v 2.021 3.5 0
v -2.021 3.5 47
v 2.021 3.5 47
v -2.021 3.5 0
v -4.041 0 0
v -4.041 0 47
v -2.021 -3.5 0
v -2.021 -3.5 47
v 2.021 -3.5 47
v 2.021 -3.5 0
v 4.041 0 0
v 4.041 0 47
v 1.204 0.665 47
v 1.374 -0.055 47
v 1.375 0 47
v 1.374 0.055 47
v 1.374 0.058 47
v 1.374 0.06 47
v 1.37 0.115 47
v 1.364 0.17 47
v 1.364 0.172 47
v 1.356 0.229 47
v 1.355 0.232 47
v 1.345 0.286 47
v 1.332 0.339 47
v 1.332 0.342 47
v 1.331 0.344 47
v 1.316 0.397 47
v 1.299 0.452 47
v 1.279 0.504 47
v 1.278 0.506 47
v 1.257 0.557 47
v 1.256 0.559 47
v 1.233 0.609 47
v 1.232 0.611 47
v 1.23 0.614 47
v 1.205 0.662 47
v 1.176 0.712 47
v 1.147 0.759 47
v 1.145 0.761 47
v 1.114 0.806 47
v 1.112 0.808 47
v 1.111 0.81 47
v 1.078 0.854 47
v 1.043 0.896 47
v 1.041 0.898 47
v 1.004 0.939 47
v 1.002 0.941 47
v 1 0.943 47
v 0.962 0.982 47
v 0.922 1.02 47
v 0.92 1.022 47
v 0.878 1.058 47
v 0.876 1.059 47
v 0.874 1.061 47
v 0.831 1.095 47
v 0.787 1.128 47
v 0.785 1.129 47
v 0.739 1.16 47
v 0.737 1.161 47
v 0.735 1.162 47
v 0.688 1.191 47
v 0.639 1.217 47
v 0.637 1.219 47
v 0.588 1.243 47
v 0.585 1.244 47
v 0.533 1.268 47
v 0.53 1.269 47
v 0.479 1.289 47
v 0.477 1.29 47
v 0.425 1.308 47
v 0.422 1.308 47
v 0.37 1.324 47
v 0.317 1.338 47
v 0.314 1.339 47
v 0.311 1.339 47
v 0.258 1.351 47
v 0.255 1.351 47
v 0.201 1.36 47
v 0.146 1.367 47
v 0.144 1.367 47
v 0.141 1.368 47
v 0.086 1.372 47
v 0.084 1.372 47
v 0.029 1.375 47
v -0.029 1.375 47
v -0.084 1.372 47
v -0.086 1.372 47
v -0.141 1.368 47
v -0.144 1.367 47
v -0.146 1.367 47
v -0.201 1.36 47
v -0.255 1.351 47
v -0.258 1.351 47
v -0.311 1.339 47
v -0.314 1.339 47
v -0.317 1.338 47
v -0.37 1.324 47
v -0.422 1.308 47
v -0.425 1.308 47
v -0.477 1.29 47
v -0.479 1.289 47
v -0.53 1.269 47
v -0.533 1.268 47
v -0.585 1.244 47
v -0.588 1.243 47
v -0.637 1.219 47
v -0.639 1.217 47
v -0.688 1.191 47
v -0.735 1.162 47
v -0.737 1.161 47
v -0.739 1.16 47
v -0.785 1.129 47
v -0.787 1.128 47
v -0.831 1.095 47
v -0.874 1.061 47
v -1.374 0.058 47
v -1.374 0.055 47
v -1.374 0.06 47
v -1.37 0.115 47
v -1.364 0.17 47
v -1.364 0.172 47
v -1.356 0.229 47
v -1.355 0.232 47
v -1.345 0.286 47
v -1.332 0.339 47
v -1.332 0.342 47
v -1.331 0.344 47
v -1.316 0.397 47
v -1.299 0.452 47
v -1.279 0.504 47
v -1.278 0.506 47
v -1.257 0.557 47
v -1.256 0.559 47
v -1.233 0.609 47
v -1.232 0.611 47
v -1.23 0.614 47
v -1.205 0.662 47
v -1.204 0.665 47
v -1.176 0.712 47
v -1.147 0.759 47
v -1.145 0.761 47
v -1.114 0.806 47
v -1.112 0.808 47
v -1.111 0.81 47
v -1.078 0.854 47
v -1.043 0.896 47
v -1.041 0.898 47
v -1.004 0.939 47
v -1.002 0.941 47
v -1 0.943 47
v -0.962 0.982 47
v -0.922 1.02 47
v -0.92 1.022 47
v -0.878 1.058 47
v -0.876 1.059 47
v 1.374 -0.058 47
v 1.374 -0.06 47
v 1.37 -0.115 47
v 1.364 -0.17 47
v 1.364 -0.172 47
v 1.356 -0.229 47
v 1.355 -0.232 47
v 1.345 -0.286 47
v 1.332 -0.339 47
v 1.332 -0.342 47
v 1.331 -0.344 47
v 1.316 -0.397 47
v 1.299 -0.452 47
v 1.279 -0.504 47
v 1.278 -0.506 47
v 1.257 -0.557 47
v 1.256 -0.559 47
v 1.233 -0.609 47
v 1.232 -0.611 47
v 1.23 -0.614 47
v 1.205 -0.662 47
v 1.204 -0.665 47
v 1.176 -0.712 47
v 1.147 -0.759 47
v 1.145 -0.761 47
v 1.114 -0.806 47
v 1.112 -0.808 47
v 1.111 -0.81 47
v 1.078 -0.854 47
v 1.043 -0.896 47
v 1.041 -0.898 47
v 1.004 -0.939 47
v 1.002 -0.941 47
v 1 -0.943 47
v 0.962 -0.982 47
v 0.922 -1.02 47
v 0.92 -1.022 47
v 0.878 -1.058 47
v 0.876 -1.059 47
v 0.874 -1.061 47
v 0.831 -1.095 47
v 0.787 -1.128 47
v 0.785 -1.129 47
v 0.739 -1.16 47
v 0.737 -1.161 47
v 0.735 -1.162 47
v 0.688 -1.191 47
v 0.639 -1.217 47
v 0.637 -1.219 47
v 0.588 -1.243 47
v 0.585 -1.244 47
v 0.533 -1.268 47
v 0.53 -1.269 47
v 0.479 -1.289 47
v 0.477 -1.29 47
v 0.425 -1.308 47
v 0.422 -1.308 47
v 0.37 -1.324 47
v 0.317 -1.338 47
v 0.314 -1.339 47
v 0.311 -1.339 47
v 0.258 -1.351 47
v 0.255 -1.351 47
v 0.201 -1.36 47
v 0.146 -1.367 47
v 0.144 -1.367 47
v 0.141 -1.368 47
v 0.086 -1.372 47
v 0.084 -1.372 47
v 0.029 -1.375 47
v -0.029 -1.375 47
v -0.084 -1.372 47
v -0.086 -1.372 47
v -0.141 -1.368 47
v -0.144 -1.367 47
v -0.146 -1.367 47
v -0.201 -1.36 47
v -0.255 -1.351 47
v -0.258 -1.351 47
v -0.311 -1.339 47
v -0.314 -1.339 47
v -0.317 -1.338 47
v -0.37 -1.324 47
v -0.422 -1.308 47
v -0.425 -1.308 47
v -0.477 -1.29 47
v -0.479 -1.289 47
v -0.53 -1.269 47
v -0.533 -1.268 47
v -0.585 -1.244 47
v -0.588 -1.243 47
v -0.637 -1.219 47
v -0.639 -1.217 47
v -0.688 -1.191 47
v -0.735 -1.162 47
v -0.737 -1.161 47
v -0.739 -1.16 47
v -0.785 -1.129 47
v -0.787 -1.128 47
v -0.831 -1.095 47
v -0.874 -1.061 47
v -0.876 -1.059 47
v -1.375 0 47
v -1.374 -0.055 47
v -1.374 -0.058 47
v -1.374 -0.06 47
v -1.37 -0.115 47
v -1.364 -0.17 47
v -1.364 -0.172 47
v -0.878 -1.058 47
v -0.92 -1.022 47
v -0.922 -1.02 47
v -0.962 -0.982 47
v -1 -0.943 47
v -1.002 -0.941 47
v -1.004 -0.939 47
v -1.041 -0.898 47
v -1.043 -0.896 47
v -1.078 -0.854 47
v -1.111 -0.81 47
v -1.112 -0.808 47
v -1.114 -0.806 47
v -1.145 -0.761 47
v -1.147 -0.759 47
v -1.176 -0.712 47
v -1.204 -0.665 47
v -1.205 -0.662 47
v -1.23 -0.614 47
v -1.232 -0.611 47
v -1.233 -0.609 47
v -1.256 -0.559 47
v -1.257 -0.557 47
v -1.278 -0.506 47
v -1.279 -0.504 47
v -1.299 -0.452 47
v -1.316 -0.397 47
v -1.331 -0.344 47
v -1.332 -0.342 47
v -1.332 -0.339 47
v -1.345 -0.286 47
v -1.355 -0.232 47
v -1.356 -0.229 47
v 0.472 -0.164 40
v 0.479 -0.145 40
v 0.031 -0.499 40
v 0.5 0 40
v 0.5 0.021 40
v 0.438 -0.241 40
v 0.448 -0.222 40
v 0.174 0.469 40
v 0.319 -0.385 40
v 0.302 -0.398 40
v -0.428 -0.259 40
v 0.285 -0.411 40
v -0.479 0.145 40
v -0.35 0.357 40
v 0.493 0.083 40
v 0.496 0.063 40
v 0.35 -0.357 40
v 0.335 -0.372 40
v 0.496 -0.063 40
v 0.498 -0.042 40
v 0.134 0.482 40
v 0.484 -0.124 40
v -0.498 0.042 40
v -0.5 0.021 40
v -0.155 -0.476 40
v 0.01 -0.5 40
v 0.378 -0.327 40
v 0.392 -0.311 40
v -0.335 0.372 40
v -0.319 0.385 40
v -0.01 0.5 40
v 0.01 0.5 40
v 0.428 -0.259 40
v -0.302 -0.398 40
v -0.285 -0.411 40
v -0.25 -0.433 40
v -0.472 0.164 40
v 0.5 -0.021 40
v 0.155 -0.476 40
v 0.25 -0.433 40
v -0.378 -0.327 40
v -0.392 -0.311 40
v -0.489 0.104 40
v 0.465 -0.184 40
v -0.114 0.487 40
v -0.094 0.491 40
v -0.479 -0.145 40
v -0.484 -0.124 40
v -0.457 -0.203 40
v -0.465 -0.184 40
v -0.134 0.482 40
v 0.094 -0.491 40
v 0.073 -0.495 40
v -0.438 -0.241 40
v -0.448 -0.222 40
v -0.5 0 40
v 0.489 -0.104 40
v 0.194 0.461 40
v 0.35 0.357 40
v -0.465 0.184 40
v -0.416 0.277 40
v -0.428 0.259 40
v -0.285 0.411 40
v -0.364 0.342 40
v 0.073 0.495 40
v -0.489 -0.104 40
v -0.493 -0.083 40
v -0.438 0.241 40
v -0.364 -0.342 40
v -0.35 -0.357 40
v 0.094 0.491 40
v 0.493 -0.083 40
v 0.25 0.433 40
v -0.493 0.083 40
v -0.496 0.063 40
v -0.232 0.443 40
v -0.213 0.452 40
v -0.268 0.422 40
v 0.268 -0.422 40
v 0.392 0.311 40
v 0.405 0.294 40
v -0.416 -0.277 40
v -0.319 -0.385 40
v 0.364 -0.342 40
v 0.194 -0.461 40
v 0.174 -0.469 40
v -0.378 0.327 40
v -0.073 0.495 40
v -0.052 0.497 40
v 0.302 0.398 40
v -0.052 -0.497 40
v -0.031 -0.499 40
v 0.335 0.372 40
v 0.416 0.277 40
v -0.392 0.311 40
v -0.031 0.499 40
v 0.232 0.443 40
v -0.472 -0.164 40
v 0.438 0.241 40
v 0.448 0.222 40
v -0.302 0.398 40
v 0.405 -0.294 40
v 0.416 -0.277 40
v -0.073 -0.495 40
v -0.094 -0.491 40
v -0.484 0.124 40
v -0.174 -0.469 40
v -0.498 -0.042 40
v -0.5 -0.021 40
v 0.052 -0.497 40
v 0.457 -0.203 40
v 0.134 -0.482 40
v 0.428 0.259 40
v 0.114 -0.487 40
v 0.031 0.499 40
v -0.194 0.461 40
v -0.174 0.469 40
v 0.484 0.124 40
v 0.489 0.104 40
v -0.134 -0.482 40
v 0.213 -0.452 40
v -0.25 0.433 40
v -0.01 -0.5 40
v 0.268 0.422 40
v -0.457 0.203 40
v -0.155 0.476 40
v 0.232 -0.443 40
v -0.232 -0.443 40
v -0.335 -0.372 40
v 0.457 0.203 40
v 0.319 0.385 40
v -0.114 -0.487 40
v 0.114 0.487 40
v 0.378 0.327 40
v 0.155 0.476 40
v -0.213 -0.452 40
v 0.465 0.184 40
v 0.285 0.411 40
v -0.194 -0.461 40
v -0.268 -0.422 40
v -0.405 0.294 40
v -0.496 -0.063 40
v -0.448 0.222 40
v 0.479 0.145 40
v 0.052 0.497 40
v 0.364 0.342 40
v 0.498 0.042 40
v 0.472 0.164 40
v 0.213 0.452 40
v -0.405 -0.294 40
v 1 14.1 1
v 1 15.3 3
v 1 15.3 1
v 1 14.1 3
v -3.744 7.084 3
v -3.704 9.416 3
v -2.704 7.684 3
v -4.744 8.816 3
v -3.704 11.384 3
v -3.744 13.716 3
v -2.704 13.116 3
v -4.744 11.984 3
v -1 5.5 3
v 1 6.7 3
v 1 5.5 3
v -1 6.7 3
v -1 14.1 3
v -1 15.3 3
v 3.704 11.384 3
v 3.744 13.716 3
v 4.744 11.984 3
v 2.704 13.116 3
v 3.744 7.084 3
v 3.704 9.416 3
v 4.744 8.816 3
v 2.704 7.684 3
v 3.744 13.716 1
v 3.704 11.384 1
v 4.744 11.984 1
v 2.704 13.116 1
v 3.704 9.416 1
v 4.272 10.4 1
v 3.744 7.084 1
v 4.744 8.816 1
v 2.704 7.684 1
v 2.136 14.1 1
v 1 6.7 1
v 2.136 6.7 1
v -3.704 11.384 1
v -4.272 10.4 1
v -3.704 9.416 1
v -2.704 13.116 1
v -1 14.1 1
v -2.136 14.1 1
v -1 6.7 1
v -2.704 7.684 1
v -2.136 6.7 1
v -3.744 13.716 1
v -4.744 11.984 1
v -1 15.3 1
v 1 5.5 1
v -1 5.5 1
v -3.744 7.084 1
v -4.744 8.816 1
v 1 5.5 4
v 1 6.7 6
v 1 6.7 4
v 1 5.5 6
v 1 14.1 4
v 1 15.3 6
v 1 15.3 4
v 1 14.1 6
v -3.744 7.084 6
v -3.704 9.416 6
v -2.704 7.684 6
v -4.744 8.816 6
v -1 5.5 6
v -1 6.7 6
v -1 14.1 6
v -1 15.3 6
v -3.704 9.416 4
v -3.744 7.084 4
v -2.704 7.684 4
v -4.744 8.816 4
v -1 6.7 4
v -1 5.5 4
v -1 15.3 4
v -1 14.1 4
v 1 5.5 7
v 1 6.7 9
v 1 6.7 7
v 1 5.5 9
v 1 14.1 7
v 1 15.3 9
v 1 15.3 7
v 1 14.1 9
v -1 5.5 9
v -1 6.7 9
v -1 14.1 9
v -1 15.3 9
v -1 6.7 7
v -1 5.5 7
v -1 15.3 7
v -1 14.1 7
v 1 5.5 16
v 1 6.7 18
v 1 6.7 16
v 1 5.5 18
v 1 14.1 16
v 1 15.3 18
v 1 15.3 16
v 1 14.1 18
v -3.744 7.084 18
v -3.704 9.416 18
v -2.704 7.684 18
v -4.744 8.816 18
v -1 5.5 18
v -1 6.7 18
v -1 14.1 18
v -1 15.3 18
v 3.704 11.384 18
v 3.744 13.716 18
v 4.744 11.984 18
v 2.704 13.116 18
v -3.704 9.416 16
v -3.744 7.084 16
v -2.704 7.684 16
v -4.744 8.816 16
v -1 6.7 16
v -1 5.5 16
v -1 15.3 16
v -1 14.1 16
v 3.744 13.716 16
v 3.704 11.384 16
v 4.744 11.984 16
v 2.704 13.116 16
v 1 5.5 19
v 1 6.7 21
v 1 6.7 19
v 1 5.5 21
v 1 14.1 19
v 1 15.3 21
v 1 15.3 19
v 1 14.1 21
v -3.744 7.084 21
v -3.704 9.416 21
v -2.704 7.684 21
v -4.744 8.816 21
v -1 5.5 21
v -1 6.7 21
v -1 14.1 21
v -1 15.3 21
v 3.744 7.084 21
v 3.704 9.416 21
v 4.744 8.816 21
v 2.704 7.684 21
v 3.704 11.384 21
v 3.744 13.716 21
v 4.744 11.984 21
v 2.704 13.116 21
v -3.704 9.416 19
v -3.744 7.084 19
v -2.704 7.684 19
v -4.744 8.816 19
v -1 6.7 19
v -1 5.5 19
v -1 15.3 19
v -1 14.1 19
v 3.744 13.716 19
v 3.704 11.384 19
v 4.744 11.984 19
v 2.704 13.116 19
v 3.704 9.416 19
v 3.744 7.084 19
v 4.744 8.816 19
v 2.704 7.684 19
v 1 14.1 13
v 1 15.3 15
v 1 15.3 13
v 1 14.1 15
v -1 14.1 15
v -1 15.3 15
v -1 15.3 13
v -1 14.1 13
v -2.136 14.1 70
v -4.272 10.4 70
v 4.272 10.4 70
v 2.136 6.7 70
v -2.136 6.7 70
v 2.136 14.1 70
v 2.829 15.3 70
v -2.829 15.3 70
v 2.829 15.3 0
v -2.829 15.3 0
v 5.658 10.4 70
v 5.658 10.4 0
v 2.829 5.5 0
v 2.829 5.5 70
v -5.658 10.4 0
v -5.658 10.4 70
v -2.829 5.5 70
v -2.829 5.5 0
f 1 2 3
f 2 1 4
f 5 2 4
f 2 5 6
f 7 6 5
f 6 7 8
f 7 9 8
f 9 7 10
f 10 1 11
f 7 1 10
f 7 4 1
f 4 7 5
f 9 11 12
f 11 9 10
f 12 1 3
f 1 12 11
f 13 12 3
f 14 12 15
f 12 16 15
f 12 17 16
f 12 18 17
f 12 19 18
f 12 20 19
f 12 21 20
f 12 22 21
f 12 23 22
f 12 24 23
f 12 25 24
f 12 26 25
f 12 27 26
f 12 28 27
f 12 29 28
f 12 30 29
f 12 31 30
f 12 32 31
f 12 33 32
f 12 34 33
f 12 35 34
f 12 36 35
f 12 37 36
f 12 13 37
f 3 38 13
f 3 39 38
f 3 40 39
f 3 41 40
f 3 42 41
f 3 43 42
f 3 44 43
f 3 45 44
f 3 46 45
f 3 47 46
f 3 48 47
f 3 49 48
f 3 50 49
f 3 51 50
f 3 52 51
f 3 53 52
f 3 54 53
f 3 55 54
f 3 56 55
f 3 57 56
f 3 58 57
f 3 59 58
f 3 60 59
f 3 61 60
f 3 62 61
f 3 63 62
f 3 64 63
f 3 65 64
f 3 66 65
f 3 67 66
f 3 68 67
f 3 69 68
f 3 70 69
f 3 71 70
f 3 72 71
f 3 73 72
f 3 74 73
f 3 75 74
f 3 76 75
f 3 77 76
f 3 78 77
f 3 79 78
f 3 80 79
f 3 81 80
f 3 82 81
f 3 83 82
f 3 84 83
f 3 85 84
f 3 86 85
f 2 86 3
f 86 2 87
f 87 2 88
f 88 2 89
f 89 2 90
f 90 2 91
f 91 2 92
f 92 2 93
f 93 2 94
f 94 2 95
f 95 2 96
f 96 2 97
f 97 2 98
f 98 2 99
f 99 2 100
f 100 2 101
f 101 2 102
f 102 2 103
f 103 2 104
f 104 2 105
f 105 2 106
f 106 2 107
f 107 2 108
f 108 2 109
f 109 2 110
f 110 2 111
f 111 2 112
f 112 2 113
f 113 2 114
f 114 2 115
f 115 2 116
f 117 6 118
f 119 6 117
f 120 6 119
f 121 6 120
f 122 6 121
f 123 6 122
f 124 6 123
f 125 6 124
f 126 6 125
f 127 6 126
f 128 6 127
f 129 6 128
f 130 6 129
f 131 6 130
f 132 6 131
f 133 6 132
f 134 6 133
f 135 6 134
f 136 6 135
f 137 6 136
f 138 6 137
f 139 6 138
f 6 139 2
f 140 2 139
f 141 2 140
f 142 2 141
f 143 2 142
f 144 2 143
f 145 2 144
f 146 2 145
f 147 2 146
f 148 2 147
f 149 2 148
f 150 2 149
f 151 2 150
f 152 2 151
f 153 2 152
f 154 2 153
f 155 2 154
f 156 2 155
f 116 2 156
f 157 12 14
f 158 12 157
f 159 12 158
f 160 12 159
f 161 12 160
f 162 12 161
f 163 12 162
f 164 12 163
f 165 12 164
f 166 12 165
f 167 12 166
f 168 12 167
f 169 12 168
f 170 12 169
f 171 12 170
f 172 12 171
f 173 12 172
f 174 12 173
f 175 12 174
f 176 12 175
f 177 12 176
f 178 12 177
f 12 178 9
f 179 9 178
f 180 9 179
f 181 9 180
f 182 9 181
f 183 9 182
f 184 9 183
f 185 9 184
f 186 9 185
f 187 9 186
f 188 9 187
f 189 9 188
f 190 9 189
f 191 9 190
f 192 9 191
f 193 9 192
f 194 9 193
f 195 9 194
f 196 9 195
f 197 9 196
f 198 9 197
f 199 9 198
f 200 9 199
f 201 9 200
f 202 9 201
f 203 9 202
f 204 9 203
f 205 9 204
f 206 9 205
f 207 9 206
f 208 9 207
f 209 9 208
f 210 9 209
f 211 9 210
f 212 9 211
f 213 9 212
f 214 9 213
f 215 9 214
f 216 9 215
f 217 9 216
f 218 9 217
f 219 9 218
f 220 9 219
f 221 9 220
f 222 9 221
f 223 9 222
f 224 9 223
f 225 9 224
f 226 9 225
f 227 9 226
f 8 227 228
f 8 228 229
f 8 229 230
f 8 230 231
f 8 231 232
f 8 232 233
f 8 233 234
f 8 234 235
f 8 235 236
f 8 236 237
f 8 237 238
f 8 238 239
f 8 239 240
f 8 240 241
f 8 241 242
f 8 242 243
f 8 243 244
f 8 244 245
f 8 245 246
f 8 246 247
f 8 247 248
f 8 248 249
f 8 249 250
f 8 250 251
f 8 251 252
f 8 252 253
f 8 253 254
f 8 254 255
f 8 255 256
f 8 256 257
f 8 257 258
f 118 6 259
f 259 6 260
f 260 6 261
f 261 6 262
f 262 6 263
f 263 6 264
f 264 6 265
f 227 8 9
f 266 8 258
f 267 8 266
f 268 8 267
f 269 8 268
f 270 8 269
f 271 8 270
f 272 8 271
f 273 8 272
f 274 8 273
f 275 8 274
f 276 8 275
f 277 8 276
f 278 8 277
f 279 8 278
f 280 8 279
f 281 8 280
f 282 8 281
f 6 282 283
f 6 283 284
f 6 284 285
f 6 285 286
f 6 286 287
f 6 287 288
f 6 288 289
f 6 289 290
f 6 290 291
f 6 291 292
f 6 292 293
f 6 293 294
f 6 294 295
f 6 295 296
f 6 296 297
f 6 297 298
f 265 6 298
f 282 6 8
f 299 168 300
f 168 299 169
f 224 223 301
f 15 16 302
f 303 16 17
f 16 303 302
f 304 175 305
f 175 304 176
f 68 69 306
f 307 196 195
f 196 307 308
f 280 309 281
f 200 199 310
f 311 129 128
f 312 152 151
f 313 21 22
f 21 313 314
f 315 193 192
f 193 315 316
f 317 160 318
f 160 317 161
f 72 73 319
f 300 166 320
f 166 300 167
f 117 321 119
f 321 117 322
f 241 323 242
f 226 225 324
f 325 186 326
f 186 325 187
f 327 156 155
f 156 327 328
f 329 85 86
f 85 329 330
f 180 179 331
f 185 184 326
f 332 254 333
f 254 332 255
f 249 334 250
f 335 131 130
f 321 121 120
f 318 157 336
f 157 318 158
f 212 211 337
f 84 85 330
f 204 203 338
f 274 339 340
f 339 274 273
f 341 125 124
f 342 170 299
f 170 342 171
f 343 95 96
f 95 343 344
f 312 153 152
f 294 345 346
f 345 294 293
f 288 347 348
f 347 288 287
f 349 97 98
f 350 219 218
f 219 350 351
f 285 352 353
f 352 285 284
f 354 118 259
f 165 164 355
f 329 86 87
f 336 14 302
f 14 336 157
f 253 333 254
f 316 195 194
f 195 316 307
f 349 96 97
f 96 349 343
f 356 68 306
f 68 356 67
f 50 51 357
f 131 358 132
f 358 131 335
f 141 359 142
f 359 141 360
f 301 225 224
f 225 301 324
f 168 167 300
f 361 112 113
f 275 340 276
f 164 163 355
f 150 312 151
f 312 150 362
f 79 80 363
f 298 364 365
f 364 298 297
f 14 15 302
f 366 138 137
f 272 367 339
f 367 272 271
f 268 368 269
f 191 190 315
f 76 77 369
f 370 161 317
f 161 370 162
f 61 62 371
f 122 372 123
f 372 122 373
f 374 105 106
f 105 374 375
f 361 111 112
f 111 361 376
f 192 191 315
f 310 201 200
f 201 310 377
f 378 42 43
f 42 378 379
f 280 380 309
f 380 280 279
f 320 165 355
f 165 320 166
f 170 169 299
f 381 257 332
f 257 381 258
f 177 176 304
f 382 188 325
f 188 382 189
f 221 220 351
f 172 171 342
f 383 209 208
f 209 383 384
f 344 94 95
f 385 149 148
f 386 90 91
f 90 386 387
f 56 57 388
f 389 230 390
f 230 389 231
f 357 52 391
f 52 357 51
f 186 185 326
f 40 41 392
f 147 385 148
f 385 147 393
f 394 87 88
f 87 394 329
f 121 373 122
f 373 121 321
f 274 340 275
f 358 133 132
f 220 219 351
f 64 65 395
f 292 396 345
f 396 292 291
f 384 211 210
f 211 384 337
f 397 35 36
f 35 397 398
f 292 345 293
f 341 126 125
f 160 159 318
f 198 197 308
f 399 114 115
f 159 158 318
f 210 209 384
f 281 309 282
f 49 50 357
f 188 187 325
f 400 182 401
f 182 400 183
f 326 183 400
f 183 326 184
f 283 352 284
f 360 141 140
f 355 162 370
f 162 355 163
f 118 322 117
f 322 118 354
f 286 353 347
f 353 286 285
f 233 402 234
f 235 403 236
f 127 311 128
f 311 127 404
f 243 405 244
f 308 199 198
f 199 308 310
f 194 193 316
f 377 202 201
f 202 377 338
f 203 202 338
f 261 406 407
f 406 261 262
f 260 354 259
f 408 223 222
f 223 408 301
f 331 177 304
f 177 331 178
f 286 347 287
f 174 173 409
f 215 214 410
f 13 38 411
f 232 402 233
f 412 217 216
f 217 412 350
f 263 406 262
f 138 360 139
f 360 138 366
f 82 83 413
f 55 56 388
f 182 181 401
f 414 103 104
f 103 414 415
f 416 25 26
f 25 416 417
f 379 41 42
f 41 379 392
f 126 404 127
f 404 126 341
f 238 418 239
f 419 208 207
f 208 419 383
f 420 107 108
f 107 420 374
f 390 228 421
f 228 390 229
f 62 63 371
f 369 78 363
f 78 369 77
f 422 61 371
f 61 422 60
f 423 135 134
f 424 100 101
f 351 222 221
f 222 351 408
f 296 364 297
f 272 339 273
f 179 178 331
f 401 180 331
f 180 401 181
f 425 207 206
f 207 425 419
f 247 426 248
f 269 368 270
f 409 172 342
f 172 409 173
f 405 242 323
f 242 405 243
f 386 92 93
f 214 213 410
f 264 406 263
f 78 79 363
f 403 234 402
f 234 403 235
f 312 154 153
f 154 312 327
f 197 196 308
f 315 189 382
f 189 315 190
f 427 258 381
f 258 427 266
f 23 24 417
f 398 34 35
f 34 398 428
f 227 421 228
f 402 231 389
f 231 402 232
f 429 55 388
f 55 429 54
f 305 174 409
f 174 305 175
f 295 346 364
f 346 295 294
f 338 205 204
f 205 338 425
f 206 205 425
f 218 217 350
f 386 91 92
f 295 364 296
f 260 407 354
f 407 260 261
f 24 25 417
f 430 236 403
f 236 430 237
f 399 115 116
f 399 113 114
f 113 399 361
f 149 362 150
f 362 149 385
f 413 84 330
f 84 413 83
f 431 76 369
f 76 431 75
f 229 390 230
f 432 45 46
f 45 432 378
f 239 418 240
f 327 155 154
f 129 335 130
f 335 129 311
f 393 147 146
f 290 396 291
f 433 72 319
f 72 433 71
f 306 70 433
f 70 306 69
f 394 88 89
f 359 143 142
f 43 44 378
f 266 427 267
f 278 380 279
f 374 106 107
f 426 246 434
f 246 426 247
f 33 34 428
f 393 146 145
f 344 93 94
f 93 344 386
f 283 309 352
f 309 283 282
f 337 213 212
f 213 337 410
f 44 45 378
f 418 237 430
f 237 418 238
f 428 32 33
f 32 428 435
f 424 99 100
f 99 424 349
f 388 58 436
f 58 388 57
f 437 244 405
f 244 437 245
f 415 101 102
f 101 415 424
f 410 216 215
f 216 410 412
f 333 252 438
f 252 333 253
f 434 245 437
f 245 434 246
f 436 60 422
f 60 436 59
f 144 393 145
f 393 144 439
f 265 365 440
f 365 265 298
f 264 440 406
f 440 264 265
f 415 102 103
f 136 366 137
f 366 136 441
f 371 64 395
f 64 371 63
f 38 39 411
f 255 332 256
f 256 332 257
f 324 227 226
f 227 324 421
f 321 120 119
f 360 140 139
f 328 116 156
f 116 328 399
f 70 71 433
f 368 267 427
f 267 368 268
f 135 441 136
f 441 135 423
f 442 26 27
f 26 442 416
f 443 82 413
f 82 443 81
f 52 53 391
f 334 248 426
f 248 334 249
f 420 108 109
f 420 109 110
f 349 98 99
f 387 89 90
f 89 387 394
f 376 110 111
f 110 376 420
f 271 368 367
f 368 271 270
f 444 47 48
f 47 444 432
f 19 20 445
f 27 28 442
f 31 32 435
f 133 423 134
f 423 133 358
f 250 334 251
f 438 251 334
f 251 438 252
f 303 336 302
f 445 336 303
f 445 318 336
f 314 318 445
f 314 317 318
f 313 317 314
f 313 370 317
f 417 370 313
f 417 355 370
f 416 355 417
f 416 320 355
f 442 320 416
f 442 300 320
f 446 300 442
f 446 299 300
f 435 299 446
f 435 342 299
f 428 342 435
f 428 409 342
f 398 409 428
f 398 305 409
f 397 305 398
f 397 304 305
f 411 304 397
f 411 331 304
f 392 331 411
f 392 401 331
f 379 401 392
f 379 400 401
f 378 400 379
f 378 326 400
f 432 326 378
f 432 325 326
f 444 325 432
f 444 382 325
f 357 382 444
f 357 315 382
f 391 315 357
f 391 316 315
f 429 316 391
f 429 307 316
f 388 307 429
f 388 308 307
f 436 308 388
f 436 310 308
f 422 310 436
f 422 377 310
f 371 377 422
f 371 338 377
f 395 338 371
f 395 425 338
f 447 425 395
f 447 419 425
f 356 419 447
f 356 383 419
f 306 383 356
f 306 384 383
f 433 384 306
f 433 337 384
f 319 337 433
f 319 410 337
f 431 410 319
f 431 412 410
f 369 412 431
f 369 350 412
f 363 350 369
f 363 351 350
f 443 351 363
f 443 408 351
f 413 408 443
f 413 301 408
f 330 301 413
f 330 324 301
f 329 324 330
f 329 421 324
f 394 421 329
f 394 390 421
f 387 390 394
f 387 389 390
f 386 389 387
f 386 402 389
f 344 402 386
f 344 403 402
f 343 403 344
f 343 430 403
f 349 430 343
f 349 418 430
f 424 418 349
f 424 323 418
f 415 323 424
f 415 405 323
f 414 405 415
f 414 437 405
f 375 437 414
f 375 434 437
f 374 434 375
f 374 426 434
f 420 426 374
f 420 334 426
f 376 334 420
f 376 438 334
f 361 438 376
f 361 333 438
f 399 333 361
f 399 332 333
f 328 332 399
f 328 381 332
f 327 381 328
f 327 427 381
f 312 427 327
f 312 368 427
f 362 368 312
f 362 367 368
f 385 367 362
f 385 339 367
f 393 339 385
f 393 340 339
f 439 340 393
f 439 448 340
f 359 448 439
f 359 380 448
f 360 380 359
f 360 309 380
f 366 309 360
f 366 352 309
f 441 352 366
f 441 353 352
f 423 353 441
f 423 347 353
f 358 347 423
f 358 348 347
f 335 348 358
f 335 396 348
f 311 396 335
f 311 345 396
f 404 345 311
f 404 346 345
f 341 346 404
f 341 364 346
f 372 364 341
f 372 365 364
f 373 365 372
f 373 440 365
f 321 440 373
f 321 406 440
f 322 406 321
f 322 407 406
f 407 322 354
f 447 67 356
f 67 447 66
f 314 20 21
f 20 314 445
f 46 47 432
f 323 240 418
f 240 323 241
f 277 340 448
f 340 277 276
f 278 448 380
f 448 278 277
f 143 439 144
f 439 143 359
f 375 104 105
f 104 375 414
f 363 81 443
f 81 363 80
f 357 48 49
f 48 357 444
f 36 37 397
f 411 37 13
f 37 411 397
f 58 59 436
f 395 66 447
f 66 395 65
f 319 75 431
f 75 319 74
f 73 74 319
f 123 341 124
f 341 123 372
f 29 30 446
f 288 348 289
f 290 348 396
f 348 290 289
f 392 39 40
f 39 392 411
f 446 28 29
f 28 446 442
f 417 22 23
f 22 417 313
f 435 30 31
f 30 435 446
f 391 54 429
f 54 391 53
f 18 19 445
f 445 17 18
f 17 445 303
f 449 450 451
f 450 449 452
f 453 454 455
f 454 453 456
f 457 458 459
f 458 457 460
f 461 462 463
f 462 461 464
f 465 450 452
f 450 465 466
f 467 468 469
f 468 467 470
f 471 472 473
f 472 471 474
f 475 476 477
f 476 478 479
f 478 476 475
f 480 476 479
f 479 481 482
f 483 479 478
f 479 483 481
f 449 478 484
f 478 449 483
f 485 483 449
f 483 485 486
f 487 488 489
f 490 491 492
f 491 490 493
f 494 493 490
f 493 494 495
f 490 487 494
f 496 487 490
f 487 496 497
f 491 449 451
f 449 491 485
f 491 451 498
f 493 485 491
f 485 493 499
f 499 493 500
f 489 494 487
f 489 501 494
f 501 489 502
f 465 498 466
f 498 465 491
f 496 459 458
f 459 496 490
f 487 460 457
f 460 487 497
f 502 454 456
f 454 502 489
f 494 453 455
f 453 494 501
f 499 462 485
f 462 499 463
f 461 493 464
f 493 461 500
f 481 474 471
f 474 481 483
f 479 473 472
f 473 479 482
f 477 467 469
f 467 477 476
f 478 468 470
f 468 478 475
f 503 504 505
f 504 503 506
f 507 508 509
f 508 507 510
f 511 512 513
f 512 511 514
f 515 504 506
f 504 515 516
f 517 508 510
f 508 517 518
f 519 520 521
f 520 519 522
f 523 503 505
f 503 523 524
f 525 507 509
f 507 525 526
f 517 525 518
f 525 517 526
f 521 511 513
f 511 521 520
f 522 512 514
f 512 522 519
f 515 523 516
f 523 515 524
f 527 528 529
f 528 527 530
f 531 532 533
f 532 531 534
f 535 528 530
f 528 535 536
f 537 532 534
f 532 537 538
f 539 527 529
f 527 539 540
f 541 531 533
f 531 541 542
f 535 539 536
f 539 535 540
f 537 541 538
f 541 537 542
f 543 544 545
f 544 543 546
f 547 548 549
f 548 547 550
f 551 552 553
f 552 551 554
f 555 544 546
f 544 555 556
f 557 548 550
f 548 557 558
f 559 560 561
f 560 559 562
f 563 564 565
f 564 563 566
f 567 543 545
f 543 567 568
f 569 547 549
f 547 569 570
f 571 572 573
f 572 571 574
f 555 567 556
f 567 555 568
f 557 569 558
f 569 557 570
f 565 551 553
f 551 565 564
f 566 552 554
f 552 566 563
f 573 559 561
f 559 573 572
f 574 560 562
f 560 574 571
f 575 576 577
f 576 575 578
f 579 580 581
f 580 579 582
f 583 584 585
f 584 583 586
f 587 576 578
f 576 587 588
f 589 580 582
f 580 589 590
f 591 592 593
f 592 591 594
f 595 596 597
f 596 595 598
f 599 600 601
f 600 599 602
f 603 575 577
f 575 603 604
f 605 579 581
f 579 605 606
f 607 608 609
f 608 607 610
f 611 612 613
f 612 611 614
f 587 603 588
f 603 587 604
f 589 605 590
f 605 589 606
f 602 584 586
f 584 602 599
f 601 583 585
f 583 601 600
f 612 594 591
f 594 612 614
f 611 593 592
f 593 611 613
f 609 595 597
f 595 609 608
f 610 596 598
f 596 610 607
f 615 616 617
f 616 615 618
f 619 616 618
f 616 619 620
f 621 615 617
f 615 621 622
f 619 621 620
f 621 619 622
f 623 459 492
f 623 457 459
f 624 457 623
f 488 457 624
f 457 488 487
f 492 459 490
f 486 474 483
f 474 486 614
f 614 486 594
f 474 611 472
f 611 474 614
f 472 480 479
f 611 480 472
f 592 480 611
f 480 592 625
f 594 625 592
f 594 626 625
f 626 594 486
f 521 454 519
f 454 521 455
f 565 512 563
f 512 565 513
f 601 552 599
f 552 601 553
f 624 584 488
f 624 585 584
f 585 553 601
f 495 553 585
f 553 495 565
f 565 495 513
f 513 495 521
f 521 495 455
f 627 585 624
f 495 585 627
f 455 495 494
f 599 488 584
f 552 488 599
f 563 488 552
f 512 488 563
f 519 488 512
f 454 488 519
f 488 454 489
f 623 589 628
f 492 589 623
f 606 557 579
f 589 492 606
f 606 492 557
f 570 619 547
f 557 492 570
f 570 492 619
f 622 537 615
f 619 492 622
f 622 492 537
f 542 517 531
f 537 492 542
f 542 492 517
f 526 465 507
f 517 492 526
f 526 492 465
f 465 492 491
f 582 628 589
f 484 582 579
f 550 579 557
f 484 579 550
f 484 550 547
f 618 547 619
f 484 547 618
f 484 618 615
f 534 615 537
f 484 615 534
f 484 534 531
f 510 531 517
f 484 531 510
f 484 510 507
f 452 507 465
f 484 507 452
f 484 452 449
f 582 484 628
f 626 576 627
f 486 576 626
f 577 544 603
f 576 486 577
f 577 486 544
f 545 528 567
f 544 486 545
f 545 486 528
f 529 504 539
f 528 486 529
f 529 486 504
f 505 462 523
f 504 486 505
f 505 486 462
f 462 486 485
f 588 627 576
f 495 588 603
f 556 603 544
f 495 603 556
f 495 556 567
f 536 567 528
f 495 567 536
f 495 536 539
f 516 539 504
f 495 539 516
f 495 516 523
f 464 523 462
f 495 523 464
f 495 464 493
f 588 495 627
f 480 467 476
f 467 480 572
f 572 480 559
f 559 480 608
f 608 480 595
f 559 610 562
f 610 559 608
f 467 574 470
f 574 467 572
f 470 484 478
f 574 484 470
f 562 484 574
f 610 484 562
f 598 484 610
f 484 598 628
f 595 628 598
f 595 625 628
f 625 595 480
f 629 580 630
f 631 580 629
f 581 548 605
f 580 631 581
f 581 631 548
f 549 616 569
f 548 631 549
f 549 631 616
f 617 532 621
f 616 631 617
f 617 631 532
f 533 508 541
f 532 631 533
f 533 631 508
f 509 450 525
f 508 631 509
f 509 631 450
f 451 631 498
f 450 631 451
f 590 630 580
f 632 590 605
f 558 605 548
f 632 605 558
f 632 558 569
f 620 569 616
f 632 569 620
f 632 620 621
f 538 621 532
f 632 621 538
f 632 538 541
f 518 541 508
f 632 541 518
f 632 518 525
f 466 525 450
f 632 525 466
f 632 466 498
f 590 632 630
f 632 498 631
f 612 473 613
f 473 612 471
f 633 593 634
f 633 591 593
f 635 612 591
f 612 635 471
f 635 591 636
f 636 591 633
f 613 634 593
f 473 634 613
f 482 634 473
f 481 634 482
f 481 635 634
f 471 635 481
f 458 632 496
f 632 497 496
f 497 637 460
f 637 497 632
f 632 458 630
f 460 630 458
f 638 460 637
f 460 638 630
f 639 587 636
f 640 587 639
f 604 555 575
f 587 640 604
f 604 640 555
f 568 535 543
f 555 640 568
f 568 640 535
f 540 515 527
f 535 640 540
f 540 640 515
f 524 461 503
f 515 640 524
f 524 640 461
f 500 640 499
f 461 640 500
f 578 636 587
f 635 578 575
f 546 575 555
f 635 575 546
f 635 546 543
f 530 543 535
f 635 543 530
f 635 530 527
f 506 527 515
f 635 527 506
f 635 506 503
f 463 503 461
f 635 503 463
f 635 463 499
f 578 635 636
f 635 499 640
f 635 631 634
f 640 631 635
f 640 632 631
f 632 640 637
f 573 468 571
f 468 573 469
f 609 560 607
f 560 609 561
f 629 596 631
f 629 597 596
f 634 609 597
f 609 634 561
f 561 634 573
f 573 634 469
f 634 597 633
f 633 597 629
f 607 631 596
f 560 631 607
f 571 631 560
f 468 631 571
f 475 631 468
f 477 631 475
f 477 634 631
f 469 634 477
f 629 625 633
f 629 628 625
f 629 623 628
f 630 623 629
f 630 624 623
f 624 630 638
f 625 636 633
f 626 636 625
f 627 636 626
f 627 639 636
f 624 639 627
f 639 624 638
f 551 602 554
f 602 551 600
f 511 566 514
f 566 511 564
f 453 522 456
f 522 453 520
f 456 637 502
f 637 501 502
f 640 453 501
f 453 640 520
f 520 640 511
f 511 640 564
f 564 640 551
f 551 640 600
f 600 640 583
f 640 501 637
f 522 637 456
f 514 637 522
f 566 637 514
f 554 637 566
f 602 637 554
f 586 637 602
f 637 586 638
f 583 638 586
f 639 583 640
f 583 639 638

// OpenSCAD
// dice pencil extender cap
// version 0.0.1
// by pixelhaufen
// is licensed under CC BY-SA 3.0 -> https://creativecommons.org/licenses/by-sa/3.0/

//------------------------------------------------------------------
// User Inputs

/*[dice and extender]*/

// shape of the pencil
shape = "hexagon"; // [hexagon,round]

// generate the extender part
extender = "yes"; // [yes,no]
// requires extender
dice = "yes"; // [yes,no]
// pencil diameter
inner_diameter = 7; // [3:0.1:10]
// height of the extender
height = 70; // [22:1:80]
// use a multiple of your nozzle
shell = 1.2; // [0.1:0.05:5]

/*[filler]*/
// generate a filler
filler = "yes"; // [yes,no]
// protect the point requires filler
cap = "yes"; // [yes,no]
// depth of the hole for the pencil
depth = 22; // [0:1:79]


/*[Hidden]*/
$fn = 150; // can't be modified on thingiverse
incircle = inner_diameter/2;
spacing = 0.2;


//------------------------------------------------------------------
// Main

if(filler=="yes")
{
    if(cap=="yes")
    {
        difference()
        {
            if(shape=="round")
            {
                cylinder(r1=incircle, r2=incircle, h=height-depth-1, center=false);
            }
            if(shape=="hexagon")
            {
                hexagon(incircle,height-depth-1);
            }

            translate([0,0,height-depth-8])
            {
                cylinder(r1=0.5, r2=1.5, h=8, center=false);
            }
        }
    }
    else
    {
        hexagon(incircle,height-depth-1);
    }
    
    if(extender=="yes")
    {
        translate([0,(incircle*2+shell+spacing+2),0])
        {
            extender();
        }
    }
}
else
{
    if(extender=="yes")
    {
        extender();
    }
}


//------------------------------------------------------------------
// Modules

module extender()
{
    difference()
    {
        hexagon(incircle+shell+spacing,height);
        
        union()
        {
            translate([0,0,1])
            {
                if(shape=="round")
                {
                    cylinder(r1=incircle+spacing, r2=incircle+spacing, h=height, center=false);
                }
                if(shape=="hexagon")
                {
                    hexagon(incircle+spacing,height);
                }
            }
            
            if(dice=="yes")
            {
                //     6,1,4,5,2,3,  h
                holes([1,1,1,1,1,1], 1);
                holes([1,0,1,1,0,0], 4);
                holes([1,0,0,1,0,0], 7);
            
                holes([1,0,0,0,0,0], 13);
                holes([1,0,1,1,0,1], 16);
                holes([1,0,1,1,1,1], 19);
            }
        }
    }
}

module holes(hx, height)
{
    for(x = [0:len(hx)])
    {
        pos = 360/len(hx) * x;
        
        if(hx[x]==1)
        {
            rotate([0, 0, pos])
            {
                translate([-1,0,height])
                {
                    cube([2, incircle+shell+spacing, 2], center=false);
                }
            }
        }
    }
}

module hexagon(incircle, height)
{
    r=incircle/(sqrt(3)/2);
    linear_extrude(height = height, center = false, convexity = 10, twist = 0)
    {
        angles=[ for (i = [0:6-1]) i*(360/6) ];
        coords=[ for (th=angles) [r*cos(th), r*sin(th)] ];
        polygon(coords);
    }
 }
 
